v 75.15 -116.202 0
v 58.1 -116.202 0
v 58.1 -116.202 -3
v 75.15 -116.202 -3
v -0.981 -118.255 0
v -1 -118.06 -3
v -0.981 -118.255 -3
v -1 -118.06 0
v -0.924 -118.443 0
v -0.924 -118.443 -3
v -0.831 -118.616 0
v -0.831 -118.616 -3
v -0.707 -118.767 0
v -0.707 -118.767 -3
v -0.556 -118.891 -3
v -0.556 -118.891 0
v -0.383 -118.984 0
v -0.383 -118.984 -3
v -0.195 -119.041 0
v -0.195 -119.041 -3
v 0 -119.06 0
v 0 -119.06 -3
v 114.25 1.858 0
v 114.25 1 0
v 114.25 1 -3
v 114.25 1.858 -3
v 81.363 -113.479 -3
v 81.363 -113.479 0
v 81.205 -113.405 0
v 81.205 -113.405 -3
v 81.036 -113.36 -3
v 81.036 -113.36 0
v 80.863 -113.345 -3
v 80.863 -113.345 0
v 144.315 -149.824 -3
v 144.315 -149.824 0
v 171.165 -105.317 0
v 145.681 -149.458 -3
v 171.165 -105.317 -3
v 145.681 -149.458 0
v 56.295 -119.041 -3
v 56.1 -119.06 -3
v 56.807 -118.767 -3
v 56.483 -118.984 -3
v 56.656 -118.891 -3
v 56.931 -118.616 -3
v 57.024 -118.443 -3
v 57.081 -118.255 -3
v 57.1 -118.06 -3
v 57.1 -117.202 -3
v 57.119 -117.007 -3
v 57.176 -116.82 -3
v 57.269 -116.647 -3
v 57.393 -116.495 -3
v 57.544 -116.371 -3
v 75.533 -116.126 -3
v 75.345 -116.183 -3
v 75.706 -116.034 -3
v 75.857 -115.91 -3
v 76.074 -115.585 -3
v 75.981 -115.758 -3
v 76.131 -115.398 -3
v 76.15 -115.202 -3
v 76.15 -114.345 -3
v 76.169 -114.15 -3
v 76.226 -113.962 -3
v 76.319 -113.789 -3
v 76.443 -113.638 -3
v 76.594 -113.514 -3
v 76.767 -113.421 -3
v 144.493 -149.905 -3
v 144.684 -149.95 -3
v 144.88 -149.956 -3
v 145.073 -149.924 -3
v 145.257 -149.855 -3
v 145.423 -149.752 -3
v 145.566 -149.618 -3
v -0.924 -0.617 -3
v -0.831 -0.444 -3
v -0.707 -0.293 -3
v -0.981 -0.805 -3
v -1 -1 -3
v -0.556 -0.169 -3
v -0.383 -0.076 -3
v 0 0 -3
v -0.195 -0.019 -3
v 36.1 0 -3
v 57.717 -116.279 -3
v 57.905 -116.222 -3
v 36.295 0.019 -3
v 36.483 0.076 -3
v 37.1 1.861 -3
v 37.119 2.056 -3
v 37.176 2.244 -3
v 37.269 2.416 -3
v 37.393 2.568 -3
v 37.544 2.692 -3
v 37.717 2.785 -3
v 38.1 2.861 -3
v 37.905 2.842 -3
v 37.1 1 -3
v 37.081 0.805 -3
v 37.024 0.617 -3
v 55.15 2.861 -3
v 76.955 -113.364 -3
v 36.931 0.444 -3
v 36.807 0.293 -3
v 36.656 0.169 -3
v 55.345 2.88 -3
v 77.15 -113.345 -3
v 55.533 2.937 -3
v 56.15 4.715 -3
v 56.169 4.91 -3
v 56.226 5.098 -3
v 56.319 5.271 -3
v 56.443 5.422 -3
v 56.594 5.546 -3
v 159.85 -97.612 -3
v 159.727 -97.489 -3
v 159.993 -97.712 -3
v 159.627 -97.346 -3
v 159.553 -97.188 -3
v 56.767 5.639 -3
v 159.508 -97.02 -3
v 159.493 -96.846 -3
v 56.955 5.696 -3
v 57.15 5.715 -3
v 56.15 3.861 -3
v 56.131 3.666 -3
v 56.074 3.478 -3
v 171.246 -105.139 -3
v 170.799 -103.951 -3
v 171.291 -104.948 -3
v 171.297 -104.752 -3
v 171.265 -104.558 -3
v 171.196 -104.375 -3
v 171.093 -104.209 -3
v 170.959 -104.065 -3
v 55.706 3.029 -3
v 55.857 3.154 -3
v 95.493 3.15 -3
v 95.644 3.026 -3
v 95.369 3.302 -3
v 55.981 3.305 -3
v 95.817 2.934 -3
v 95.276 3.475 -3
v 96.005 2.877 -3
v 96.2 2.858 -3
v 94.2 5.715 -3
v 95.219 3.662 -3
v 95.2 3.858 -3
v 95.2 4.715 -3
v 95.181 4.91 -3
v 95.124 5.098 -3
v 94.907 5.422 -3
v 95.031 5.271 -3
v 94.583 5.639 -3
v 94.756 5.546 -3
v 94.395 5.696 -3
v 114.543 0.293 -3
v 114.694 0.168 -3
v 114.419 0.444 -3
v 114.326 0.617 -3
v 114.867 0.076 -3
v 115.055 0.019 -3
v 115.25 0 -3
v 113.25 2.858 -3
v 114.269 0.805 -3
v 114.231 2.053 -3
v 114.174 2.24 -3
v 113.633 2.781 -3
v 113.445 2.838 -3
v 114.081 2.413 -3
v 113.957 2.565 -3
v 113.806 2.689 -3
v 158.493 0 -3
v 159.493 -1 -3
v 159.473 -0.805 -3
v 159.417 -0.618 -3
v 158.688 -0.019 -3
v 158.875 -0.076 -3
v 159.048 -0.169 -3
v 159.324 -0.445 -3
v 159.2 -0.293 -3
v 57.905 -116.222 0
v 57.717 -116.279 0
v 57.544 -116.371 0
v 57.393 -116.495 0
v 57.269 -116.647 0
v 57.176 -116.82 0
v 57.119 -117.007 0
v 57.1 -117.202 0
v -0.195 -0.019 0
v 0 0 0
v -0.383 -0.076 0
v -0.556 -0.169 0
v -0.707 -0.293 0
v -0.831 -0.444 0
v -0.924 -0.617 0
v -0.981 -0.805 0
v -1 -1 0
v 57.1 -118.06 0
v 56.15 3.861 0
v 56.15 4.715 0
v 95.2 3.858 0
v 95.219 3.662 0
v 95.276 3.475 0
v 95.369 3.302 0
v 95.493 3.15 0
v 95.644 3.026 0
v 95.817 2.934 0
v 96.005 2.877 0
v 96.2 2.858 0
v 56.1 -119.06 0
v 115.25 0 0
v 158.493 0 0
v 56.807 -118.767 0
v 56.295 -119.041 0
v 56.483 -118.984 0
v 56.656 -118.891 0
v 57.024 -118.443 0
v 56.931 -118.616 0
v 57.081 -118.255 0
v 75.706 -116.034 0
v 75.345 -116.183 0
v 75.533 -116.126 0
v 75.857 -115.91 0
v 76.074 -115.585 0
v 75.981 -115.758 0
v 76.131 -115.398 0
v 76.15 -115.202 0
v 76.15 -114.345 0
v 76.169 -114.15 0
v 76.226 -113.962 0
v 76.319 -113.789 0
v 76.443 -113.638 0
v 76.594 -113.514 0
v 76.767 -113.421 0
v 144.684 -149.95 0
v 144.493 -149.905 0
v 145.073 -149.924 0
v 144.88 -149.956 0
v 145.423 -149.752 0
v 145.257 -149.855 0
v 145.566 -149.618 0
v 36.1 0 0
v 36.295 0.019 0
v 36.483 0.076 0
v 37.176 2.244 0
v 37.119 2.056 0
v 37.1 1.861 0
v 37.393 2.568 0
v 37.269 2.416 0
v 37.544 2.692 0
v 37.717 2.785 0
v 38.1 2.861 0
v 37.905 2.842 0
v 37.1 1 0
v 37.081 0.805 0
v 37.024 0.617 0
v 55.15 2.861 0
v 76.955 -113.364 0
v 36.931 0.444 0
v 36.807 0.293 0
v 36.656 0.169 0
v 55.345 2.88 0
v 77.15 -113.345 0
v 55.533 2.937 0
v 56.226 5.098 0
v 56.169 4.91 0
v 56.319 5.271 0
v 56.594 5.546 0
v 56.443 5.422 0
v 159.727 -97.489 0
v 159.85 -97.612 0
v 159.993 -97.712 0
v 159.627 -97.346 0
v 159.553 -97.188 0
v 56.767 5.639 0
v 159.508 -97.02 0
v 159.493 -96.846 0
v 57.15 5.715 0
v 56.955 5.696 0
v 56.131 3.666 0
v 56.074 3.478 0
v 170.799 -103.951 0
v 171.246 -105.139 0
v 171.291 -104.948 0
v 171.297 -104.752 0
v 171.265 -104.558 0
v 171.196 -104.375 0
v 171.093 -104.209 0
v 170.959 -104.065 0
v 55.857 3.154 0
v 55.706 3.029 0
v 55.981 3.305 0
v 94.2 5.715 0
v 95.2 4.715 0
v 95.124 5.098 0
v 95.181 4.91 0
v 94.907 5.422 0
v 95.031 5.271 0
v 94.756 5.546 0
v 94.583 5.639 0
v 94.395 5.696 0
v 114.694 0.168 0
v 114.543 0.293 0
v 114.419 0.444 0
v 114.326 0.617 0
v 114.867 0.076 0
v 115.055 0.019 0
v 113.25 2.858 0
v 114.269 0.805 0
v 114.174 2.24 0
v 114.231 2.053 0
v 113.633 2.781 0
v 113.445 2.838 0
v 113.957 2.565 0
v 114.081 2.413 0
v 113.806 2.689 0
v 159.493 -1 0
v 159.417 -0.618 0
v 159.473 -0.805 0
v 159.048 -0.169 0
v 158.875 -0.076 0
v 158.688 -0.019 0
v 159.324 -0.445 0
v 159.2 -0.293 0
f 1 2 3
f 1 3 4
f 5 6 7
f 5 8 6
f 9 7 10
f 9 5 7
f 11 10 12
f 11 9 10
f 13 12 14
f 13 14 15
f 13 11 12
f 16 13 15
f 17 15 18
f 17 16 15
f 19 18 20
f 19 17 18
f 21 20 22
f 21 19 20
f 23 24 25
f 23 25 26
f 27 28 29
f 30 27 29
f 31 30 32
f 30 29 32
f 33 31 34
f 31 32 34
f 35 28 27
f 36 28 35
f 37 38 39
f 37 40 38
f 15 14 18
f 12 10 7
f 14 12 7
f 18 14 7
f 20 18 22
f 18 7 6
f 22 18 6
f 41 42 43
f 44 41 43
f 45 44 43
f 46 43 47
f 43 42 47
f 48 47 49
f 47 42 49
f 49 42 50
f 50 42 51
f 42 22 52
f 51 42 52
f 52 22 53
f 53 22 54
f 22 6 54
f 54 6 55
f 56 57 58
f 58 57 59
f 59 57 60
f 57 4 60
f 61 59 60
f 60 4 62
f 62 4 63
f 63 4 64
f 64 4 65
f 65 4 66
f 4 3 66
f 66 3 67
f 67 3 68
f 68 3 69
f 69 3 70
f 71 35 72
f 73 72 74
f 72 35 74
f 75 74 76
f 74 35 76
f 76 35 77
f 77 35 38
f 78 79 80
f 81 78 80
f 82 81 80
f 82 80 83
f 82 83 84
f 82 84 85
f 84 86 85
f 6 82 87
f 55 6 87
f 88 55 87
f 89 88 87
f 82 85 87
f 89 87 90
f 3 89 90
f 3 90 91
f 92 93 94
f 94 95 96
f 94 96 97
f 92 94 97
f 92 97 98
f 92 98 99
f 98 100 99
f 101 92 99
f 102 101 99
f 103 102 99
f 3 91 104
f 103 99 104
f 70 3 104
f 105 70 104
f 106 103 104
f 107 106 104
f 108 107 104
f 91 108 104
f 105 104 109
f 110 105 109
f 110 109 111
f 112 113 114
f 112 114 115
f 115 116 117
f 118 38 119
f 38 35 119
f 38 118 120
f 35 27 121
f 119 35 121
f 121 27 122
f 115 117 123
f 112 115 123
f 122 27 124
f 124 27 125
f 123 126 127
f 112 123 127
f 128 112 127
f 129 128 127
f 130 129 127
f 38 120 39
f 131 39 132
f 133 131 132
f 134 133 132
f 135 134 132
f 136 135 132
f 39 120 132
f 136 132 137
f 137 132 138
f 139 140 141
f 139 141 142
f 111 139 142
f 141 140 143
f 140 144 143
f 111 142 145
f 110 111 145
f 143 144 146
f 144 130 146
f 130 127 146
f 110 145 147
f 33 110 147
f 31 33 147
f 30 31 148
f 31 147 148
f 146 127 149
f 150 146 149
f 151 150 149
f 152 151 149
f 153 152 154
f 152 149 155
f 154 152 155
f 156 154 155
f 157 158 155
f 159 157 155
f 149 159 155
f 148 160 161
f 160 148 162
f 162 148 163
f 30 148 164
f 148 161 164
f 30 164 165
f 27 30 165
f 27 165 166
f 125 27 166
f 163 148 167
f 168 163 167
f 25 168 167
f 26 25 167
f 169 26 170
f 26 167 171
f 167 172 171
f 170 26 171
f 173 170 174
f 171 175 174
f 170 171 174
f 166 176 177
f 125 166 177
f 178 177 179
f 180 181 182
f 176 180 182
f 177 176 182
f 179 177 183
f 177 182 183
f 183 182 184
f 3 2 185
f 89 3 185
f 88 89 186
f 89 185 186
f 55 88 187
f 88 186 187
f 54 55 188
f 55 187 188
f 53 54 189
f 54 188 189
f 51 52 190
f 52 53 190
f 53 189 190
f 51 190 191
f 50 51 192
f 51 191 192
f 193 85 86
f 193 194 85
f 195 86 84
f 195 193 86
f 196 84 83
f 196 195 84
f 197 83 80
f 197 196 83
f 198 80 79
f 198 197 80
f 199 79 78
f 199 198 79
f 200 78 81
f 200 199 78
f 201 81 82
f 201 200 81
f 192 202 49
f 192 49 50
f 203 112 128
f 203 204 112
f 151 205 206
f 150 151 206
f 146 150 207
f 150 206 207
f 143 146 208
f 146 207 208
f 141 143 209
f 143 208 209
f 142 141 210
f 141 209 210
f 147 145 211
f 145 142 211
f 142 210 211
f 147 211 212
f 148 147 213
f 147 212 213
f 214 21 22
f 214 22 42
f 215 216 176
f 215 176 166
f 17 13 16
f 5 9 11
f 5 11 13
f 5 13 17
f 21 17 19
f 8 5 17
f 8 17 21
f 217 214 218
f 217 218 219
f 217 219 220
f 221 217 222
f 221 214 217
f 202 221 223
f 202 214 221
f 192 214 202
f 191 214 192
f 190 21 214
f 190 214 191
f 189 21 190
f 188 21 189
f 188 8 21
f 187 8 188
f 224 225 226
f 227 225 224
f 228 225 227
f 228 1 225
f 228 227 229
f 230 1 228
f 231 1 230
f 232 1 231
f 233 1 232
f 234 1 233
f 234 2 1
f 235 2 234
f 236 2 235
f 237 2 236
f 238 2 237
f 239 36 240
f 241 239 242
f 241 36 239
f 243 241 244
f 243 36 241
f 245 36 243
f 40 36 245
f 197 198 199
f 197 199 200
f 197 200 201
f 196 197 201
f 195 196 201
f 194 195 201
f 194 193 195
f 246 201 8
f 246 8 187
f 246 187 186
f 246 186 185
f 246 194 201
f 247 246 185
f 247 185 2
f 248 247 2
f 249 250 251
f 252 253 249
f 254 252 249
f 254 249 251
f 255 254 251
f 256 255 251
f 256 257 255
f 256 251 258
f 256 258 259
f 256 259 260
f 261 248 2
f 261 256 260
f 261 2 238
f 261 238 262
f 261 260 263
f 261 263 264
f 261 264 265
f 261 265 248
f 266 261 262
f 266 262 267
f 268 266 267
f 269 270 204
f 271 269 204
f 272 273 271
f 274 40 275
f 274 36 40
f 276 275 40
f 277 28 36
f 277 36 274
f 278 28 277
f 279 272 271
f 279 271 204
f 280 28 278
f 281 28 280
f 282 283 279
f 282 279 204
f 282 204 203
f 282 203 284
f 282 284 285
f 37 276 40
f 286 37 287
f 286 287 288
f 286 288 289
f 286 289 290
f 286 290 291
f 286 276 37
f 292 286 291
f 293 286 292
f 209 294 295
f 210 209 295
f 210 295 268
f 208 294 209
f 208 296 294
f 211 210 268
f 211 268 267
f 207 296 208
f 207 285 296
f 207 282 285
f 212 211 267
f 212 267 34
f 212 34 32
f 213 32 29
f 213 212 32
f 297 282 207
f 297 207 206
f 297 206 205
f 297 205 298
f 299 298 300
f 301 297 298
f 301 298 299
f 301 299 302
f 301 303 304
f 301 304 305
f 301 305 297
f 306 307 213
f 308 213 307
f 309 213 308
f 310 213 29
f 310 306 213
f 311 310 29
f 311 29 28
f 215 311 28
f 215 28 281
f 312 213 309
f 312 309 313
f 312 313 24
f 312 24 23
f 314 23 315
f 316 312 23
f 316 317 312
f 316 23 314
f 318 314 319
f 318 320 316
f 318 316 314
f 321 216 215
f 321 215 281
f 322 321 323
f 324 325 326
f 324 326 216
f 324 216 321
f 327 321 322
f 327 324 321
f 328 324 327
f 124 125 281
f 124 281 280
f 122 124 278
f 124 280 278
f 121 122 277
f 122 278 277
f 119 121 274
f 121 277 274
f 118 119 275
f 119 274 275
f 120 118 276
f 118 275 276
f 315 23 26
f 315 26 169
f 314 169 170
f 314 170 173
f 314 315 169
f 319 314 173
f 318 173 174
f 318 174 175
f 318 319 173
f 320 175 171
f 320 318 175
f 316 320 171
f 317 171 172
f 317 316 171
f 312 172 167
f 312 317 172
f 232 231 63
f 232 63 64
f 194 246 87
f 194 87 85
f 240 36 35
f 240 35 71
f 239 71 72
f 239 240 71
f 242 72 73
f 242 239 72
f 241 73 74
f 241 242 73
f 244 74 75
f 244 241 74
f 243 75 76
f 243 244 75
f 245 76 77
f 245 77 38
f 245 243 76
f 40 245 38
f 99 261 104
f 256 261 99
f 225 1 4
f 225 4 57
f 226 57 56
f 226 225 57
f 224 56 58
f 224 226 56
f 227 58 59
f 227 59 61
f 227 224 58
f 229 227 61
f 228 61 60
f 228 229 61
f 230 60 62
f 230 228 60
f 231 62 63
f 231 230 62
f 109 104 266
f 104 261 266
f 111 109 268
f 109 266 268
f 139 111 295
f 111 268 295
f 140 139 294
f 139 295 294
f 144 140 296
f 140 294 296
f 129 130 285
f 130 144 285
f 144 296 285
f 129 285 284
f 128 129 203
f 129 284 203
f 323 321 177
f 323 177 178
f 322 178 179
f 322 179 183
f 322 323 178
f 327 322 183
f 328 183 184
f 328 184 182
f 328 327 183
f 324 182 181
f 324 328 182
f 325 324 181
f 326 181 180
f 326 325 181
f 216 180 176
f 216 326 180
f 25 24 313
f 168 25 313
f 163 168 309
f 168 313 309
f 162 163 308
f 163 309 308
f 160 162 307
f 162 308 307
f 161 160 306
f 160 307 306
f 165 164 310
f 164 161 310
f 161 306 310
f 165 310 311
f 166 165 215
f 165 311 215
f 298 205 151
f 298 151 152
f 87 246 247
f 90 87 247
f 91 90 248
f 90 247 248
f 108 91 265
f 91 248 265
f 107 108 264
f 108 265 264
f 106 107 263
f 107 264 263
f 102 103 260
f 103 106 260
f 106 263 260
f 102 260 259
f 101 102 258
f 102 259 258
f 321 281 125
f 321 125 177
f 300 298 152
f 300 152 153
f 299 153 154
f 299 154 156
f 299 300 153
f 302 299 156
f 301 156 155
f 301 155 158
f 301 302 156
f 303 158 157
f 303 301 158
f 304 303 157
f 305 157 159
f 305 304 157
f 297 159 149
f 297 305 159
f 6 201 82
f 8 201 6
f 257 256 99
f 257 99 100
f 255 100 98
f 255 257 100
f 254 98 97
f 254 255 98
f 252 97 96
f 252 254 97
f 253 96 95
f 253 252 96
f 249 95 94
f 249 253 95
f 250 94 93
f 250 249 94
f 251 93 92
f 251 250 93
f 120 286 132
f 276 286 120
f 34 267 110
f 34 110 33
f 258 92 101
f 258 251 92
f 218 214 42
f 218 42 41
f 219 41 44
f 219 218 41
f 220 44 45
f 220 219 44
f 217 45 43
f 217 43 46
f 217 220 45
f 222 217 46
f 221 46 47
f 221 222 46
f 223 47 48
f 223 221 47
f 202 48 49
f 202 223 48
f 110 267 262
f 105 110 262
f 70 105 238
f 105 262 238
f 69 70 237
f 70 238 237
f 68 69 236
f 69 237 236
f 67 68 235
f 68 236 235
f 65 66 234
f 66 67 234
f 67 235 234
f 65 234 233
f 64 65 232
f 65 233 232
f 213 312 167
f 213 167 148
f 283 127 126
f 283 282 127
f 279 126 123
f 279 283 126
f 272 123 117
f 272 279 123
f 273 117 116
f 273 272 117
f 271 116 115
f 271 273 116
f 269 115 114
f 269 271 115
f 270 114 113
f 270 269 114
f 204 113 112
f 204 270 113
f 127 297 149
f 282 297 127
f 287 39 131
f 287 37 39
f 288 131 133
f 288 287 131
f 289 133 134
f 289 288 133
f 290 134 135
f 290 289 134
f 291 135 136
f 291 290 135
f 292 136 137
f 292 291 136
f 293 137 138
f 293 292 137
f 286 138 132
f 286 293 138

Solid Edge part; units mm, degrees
sketch "Sketch1" plane through (9.0161, -6.1697, 0) normal (0, 0, 1) x (1, 0, 0)
  line L0 (-10.0161, 5.1697) -> (-10.0161, -111.8903)
  arc A0 (-10.0161, -111.8903) -> (-9.0161, -112.8903) centre (-9.0161, -111.8903) ccw
  line L1 (-9.0161, -112.8903) -> (47.0839, -112.8903)
  arc A1 (47.0839, -112.8903) -> (48.0839, -111.8903) centre (47.0839, -111.8903) ccw
  line L2 (48.0839, -111.8903) -> (48.0839, -111.0328)
  arc A2 (48.0839, -111.0328) -> (49.0839, -110.0328) centre (49.0839, -111.0328) cw
  line L3 (49.0839, -110.0328) -> (66.1339, -110.0328)
  arc A3 (66.1339, -110.0328) -> (67.1339, -109.0328) centre (66.1339, -109.0328) ccw
  line L4 (67.1339, -109.0328) -> (67.1339, -108.1753)
  arc A4 (67.1339, -108.1753) -> (68.1339, -107.1753) centre (68.1339, -108.1753) cw
  line L5 (68.1339, -107.1753) -> (71.8467, -107.1753)
  arc A5 (71.8467, -107.1753) -> (72.3467, -107.3093) centre (71.8467, -108.1753) cw
  line L6 (72.3467, -107.3093) -> (135.2985, -143.6546)
  arc A6 (135.2985, -143.6546) -> (136.6646, -143.2885) centre (135.7985, -142.7885) ccw
  line L7 (136.6646, -143.2885) -> (162.1493, -99.1476)
  arc A7 (162.1493, -99.1476) -> (161.7833, -97.7816) centre (161.2833, -98.6476) ccw
  line L8 (161.7833, -97.7816) -> (150.9766, -91.5423)
  arc A8 (150.9766, -91.5423) -> (150.4766, -90.6763) centre (151.4766, -90.6763) cw
  line L9 (150.4766, -90.6763) -> (150.4766, 5.1695)
  arc A9 (150.4766, 5.1695) -> (149.4766, 6.1695) centre (149.4766, 5.1695) ccw
  line L10 (149.4766, 6.1695) -> (106.2339, 6.1695)
  arc A10 (106.2339, 6.1695) -> (105.2339, 7.1695) centre (106.2339, 7.1695) cw
  line L11 (105.2339, 7.1695) -> (105.2339, 8.0272)
  arc A11 (105.2339, 8.0272) -> (104.2339, 9.0272) centre (104.2339, 8.0272) ccw
  line L12 (104.2339, 9.0272) -> (87.1839, 9.0272)
  arc A12 (87.1839, 9.0272) -> (86.1839, 10.0272) centre (87.1839, 10.0272) cw
  line L13 (86.1839, 10.0272) -> (86.1839, 10.8847)
  arc A13 (86.1839, 10.8847) -> (85.1839, 11.8847) centre (85.1839, 10.8847) ccw
  line L14 (85.1839, 11.8847) -> (48.1339, 11.8847)
  arc A14 (48.1339, 11.8847) -> (47.1339, 10.8847) centre (48.1339, 10.8847) ccw
  line L15 (47.1339, 10.8847) -> (47.1339, 10.0306)
  arc A15 (47.1339, 10.0306) -> (46.1339, 9.0306) centre (46.1339, 10.0306) cw
  line L16 (46.1339, 9.0306) -> (29.0839, 9.0306)
  arc A16 (29.0839, 9.0306) -> (28.0839, 8.0306) centre (29.0839, 8.0306) ccw
  line L17 (28.0839, 8.0306) -> (28.0839, 7.1697)
  arc A17 (28.0839, 7.1697) -> (27.0839, 6.1697) centre (27.0839, 7.1697) cw
  line L18 (27.0839, 6.1697) -> (-9.0161, 6.1697)
  arc A18 (-9.0161, 6.1697) -> (-10.0161, 5.1697) centre (-9.0161, 5.1697) ccw
extrude "Protrusion1" add sketch "Sketch1" against normal blind 3
properties material "ABS Plastic, high impact"
